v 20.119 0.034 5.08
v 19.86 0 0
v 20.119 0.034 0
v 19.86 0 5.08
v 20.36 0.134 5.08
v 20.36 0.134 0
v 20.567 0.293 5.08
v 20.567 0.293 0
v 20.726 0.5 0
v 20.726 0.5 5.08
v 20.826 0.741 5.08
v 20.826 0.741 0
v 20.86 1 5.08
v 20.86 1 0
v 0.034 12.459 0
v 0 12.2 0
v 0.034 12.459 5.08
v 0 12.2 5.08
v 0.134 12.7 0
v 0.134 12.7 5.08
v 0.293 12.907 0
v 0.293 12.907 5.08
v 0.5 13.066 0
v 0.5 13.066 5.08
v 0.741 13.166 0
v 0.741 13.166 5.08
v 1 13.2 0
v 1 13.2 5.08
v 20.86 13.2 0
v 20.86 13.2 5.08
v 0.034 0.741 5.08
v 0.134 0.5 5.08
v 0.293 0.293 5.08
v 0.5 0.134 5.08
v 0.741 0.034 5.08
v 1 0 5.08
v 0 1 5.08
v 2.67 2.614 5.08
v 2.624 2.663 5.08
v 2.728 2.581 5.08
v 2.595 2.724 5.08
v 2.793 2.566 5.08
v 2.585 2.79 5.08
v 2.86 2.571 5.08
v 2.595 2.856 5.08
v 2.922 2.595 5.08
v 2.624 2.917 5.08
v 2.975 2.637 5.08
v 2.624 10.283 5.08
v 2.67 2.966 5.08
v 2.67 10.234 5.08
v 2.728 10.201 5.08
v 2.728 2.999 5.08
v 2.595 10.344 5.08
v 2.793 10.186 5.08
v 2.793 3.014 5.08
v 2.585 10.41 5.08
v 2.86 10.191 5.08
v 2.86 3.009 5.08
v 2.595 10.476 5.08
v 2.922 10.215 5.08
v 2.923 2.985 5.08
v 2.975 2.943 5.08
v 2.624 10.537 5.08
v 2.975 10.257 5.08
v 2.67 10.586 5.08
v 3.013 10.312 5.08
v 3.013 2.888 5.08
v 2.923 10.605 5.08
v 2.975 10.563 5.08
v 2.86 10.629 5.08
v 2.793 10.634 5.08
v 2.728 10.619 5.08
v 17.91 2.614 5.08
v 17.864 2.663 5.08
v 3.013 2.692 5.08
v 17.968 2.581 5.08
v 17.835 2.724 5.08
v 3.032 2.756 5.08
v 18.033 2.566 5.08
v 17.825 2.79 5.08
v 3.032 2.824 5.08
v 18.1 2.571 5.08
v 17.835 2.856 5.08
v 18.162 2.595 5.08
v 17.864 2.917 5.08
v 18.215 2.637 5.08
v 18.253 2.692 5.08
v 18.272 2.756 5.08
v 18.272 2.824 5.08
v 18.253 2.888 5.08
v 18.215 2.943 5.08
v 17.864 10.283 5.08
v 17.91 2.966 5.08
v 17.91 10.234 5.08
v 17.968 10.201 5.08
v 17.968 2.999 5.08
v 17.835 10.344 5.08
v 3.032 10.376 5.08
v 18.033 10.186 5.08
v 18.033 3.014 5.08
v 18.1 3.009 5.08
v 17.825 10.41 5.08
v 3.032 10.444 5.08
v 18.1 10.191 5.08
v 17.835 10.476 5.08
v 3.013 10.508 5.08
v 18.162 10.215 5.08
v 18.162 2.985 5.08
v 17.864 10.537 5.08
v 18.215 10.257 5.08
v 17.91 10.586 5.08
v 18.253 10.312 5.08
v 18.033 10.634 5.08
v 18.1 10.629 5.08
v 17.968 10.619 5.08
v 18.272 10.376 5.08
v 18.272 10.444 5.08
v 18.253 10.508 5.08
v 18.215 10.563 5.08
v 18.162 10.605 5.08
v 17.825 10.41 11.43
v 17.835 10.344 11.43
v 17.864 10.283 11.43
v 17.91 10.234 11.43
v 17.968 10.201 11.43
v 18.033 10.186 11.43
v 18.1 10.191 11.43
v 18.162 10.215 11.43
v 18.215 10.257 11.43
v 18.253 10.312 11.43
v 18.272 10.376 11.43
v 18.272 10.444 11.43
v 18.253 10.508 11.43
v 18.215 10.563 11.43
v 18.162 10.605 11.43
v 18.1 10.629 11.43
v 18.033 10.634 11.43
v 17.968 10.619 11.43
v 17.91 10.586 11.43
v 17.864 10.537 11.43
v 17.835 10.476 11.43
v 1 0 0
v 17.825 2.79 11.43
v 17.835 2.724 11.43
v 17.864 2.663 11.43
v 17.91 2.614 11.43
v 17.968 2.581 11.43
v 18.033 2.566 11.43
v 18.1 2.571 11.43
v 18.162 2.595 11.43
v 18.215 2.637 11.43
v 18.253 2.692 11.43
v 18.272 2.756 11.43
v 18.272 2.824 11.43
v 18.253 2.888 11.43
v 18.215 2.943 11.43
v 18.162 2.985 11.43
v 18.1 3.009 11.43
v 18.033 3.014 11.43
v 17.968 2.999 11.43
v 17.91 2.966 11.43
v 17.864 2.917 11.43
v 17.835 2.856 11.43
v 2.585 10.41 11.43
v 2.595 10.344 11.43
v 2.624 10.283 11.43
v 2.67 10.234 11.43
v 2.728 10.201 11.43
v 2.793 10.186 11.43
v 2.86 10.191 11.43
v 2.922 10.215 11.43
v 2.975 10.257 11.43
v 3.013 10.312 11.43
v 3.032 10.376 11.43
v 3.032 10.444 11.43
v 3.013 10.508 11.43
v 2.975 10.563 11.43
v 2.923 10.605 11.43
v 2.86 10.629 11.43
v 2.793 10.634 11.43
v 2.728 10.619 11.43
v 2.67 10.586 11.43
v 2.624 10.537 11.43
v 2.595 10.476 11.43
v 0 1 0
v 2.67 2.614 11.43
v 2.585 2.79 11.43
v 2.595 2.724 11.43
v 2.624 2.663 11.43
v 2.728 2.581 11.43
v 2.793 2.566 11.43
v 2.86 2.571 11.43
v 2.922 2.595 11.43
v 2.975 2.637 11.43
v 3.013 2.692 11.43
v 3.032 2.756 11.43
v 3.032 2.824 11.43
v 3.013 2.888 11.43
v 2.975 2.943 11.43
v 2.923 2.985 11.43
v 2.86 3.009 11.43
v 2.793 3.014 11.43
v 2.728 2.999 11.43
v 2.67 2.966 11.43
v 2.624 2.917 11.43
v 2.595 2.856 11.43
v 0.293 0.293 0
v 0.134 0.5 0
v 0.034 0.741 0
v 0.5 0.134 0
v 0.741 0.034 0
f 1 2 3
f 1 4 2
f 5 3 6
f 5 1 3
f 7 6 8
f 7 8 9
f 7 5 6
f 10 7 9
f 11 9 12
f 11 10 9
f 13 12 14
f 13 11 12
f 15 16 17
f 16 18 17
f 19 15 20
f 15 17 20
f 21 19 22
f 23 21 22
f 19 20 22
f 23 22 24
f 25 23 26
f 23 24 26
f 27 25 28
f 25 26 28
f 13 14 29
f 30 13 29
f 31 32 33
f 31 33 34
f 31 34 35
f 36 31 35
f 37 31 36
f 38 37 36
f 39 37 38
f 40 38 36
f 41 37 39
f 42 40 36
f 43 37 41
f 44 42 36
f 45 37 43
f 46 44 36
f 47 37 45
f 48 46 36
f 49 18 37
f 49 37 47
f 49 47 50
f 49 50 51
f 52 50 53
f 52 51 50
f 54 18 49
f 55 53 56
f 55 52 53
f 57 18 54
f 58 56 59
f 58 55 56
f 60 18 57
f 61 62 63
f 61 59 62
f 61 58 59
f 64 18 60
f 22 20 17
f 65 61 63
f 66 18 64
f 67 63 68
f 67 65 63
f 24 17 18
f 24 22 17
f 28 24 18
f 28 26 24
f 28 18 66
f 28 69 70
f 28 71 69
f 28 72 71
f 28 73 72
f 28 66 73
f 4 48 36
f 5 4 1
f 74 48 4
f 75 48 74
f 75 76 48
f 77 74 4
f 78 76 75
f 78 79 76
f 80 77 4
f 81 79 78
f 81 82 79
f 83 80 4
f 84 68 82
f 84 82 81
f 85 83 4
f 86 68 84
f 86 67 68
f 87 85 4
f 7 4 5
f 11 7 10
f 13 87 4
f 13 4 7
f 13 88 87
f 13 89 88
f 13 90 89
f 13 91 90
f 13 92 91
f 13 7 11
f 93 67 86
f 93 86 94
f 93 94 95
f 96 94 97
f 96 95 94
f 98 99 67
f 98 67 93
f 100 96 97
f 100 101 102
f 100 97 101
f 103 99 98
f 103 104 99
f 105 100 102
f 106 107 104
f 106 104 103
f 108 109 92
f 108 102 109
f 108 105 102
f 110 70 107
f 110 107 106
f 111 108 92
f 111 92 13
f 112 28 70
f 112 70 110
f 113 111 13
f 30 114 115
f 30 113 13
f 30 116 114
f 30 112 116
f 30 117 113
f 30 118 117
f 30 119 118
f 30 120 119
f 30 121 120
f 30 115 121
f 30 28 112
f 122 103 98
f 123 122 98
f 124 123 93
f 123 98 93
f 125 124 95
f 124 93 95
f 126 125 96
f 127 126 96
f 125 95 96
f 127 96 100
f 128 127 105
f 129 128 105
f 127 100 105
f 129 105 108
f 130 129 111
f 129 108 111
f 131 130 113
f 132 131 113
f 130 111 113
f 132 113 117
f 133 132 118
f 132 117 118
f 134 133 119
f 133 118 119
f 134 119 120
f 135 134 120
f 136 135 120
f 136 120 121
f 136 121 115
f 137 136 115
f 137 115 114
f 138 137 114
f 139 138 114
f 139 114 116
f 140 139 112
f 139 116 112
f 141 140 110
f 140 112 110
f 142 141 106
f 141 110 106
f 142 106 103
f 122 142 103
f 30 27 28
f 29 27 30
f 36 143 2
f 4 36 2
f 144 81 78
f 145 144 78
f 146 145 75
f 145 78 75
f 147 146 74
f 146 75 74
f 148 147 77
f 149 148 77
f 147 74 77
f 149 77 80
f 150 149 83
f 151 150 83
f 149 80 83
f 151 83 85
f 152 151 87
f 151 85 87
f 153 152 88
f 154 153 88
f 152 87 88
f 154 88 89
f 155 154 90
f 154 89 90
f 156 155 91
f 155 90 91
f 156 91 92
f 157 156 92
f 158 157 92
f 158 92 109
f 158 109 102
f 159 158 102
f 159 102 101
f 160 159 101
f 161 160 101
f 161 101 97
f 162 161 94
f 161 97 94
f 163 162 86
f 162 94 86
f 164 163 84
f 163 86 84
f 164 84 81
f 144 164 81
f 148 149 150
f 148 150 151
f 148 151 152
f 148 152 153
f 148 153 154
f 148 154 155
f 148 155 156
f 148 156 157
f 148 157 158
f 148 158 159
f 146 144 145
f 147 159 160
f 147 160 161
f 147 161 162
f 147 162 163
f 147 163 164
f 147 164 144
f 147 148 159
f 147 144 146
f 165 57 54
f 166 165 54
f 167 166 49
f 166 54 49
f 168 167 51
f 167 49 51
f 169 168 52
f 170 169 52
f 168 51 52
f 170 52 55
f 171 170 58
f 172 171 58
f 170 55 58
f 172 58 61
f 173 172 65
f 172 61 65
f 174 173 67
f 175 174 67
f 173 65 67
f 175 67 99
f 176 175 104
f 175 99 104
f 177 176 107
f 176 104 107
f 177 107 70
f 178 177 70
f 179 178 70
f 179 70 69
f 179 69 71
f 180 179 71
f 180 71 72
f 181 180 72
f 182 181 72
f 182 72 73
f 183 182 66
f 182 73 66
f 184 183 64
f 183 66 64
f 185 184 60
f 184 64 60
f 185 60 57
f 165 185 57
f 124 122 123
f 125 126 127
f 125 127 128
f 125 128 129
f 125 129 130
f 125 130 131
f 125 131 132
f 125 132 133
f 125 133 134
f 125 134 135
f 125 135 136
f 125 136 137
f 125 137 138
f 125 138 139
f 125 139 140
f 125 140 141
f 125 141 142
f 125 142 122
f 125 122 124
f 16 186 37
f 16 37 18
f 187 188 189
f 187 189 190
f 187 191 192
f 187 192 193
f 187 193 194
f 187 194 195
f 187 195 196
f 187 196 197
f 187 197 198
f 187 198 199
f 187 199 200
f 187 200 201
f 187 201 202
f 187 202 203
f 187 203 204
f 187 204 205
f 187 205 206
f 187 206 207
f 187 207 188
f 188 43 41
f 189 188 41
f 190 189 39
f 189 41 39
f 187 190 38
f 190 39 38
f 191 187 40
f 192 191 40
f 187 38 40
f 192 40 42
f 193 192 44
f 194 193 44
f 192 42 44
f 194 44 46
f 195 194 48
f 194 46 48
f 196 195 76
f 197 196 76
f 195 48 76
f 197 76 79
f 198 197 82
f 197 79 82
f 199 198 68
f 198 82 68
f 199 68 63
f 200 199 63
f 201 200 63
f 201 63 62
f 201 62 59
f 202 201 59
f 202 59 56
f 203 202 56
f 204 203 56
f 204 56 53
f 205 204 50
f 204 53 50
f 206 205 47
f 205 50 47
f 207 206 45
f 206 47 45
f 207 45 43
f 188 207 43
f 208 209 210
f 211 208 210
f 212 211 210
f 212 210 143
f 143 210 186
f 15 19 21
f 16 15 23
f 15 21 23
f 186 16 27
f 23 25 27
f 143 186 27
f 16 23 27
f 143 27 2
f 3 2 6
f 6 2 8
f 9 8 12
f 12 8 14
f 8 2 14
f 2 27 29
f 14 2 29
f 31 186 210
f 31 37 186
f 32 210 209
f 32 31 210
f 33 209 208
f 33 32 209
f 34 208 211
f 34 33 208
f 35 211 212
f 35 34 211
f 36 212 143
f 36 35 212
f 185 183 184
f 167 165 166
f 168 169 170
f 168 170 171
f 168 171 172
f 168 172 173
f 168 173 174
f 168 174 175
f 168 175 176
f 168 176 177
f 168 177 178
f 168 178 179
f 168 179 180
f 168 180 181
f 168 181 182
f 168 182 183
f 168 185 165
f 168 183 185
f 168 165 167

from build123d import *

# Parameters (mm, degrees)
SKETCH1_W           = 20.86
SKETCH1_H           = 13.2
BOSS_EXTRUDE1_DEPTH = 5.08
SKETCH2_R           = 0.225
BOSS_EXTRUDE2_DEPTH = 6.35
FILLET1_R           = 1


with BuildPart() as part:
    # Sketch1 → Boss-Extrude1 (new body)
    with BuildSketch(Plane.XY):
        with Locations((10.43, 6.6)):
            Rectangle(SKETCH1_W, SKETCH1_H)
    extrude(amount=BOSS_EXTRUDE1_DEPTH)

    # Sketch2 → Boss-Extrude2 (add)
    with BuildSketch(Plane.XY.offset(5.08)):
        with Locations(Location((2.81, 10.41, 0), (0, 0, 180))):
            Circle(SKETCH2_R)
        with Locations(Location((18.05, 10.41, 0), (0, 0, 180))):
            Circle(SKETCH2_R)
        with Locations(Location((18.05, 2.79, 0), (0, 0, 180))):
            Circle(SKETCH2_R)
        with Locations(Location((2.81, 2.79, 0), (0, 0, 180))):
            Circle(SKETCH2_R)
    extrude(amount=BOSS_EXTRUDE2_DEPTH)

    # Fillet1
    fillet1_edges = [part.edges().sort_by_distance(p)[0] for p in [
        (0, 13.2, 2.54),
        (20.86, 0, 2.54),
        (0, 0, 2.54),
    ]]
    fillet(fillet1_edges, radius=FILLET1_R)


solid = part.part
